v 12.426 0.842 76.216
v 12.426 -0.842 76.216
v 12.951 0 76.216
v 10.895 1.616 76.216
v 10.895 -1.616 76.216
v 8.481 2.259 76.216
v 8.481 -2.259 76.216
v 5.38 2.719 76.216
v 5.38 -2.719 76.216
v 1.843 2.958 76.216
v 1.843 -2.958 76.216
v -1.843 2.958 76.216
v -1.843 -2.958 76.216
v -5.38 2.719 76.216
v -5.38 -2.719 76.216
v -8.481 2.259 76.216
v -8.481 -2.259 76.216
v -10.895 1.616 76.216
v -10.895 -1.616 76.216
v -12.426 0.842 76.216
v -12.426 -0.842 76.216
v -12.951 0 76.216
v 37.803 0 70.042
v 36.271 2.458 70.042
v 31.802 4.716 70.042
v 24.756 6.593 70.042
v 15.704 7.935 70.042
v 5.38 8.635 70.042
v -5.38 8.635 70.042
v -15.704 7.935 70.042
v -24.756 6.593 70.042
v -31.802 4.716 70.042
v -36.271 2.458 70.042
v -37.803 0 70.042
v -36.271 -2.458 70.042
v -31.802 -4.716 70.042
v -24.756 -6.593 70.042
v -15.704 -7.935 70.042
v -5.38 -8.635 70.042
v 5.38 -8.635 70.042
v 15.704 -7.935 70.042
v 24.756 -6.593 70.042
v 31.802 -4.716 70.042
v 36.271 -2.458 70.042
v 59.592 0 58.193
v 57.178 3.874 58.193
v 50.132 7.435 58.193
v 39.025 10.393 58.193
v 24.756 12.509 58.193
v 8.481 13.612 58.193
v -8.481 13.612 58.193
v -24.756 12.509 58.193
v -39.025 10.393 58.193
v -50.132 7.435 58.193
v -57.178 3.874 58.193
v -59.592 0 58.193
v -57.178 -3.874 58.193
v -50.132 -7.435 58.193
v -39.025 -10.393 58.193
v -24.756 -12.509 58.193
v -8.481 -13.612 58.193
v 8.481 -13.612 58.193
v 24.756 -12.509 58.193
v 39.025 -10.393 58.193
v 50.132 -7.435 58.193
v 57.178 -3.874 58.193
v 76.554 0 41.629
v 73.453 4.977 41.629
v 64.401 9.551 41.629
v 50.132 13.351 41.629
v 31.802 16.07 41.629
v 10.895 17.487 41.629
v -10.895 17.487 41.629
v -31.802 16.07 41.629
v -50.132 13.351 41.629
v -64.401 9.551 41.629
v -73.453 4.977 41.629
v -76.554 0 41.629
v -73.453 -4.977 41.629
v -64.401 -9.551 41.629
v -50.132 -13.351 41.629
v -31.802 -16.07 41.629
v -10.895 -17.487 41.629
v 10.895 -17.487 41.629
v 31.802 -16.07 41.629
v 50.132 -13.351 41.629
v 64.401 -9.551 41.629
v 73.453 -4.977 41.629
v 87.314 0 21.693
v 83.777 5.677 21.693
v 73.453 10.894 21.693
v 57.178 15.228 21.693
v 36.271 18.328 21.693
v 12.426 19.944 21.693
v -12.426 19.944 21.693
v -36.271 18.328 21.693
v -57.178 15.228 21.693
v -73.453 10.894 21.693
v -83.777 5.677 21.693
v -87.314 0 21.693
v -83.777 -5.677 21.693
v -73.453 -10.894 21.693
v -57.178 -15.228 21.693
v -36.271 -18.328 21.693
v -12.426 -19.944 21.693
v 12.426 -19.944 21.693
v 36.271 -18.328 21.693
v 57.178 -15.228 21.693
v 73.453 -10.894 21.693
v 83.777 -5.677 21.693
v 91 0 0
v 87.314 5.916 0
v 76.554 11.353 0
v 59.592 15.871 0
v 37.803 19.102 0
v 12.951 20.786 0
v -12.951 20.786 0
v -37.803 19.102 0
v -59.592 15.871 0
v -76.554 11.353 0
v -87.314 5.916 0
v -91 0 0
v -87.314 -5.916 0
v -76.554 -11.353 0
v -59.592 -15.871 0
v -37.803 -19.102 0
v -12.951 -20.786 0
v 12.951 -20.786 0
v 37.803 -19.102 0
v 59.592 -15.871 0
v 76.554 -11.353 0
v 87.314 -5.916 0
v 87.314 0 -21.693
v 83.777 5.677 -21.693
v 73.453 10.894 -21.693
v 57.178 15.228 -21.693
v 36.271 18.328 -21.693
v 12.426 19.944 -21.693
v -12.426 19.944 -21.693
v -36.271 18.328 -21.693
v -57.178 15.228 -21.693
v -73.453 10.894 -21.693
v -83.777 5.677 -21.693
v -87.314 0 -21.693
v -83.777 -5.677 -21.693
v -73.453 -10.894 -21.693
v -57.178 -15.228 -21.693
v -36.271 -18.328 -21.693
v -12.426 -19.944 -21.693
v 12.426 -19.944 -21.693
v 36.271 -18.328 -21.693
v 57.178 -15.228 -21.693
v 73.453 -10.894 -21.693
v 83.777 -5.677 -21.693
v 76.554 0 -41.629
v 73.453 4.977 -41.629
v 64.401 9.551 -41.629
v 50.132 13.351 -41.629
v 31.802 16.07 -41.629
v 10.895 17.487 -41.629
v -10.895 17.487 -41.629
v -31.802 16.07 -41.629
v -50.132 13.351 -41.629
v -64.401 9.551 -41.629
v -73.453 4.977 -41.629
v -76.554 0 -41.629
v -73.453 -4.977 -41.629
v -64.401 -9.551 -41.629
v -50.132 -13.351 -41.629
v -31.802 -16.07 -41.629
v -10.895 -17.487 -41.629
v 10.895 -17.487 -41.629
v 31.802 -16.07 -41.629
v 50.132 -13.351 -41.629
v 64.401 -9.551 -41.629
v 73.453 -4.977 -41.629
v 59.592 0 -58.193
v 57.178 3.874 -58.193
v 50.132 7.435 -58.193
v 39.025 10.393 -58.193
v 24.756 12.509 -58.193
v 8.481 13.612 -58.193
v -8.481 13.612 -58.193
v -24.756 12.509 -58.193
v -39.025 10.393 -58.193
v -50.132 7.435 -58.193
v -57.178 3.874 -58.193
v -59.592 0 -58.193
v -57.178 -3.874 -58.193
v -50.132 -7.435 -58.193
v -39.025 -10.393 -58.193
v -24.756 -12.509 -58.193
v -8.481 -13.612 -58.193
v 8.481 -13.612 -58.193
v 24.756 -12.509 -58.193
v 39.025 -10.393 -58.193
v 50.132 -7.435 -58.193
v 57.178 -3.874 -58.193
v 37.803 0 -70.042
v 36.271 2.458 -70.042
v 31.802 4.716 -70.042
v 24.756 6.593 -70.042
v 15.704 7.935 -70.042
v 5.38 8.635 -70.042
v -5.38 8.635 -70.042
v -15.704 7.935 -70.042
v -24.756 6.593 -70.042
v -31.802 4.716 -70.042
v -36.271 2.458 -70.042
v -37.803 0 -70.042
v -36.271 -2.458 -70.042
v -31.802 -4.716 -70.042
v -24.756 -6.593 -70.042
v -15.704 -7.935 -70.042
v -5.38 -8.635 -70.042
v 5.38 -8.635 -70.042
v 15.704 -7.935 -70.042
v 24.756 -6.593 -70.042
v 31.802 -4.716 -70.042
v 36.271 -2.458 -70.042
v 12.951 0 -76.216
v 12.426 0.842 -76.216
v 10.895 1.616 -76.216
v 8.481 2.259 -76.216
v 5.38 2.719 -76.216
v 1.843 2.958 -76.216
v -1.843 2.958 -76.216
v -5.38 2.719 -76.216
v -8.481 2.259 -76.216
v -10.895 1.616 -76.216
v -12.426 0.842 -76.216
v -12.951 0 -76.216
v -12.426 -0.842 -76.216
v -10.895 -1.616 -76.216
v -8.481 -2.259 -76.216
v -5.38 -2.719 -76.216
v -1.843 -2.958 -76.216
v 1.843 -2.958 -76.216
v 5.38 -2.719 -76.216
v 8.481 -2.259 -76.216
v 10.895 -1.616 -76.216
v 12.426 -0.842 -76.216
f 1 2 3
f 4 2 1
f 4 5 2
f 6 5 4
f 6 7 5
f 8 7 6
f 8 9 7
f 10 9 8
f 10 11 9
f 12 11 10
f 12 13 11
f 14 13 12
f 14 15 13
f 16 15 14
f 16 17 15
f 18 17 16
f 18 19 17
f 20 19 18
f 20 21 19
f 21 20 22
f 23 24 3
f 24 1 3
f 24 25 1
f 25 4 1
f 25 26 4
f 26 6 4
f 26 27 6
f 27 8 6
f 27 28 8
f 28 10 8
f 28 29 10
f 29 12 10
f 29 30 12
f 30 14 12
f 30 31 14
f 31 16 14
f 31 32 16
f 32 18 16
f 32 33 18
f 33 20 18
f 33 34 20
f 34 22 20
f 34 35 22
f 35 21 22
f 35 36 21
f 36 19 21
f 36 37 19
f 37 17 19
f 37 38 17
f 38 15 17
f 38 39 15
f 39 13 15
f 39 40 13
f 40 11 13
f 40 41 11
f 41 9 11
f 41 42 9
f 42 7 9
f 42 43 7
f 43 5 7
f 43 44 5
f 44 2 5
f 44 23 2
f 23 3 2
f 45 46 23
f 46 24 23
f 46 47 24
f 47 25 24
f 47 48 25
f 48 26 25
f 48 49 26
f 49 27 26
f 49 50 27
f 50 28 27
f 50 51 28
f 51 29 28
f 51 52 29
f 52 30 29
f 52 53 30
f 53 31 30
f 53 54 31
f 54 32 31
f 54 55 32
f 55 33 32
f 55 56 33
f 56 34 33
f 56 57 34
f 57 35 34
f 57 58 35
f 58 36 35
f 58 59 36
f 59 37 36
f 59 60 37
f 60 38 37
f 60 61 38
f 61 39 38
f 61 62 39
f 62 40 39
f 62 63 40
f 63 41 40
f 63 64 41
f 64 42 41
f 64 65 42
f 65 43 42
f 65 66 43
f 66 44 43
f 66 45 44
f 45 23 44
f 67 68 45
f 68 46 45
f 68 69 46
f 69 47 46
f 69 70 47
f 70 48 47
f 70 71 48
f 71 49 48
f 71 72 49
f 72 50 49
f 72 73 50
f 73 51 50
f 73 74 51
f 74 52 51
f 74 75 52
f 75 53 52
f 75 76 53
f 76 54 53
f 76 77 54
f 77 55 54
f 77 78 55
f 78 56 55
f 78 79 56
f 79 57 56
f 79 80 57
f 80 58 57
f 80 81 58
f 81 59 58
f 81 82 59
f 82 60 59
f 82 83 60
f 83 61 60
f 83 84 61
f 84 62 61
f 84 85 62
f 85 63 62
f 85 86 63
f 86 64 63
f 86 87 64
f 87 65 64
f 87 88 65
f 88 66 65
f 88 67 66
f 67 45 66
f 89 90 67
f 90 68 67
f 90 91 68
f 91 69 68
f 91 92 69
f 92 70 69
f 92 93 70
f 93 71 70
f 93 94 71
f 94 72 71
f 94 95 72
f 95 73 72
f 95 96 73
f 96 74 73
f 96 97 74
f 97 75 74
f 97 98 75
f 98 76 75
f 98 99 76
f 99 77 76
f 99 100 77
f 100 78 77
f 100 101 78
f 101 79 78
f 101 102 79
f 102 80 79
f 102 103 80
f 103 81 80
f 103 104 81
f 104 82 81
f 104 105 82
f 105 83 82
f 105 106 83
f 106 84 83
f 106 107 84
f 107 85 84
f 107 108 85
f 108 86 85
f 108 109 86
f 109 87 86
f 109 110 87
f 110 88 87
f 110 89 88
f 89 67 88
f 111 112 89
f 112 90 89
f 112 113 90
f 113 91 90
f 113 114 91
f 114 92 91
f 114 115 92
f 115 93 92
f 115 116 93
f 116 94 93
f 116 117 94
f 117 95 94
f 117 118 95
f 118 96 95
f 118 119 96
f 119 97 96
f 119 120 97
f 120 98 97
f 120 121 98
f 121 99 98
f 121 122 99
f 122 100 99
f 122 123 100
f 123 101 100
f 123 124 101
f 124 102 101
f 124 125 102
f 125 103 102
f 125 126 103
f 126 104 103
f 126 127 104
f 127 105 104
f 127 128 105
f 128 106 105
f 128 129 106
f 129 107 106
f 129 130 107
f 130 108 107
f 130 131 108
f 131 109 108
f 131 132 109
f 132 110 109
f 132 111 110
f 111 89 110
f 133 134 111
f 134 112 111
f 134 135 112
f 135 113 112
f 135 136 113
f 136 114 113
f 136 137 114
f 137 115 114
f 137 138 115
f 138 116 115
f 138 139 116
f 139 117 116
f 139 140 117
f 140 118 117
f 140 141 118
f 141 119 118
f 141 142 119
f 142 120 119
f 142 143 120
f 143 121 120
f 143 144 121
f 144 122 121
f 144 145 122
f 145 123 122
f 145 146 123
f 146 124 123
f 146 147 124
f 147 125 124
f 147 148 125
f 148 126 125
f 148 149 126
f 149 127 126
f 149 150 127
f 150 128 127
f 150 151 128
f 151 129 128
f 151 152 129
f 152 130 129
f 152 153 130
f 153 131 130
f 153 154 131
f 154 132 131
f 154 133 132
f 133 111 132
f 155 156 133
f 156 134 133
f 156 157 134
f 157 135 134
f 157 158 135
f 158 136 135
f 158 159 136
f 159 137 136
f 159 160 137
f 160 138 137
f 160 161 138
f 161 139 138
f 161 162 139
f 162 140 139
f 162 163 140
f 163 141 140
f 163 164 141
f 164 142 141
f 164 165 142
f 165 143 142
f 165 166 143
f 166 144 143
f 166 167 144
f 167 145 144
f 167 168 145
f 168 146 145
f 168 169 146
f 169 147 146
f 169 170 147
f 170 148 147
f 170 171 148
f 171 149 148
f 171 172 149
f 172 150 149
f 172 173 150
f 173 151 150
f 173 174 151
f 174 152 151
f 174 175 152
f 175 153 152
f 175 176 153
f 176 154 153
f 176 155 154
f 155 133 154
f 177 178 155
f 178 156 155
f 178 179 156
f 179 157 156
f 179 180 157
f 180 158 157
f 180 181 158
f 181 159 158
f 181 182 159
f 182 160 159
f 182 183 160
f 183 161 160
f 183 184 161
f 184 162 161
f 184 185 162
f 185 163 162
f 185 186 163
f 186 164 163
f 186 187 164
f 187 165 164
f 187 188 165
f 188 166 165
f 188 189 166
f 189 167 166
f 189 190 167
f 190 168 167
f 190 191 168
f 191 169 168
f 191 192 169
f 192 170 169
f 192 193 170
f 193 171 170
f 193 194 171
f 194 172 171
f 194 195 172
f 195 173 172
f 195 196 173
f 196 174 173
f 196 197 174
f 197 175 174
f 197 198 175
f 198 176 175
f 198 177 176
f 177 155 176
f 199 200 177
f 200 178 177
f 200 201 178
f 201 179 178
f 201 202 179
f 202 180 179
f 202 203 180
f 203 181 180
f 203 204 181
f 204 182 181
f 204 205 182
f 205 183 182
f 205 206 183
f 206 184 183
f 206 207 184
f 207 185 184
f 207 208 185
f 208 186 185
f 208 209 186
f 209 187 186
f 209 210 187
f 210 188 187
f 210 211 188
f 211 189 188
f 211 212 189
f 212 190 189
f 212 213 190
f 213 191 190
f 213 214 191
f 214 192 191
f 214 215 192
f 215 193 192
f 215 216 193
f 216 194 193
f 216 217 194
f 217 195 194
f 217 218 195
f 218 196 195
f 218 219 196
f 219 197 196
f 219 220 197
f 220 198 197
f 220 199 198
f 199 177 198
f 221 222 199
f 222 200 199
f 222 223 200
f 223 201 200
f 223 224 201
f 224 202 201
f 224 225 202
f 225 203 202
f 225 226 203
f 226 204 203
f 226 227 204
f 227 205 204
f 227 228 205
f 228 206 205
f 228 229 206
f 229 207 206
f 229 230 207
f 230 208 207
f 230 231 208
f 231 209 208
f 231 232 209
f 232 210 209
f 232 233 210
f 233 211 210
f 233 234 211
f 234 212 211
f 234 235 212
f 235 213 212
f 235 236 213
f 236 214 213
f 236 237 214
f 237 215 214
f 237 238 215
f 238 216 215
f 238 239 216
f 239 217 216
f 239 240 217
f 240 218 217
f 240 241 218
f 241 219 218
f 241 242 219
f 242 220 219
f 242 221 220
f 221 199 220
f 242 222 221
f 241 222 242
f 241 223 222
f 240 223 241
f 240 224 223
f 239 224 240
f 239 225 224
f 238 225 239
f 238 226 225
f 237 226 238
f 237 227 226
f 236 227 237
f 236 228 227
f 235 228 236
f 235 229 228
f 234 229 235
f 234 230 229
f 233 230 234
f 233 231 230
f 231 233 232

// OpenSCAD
// Generated by SolidPython 1.0.1 on 2020-07-29 00:46:50


scale(v = [13, 3, 11]) {
	sphere(r = 7);
}
/***********************************************
*********      SolidPython code:      **********
************************************************
 
# import packages: SolidPython
from solid import *
from solid.utils import *
from itertools import chain, combinations, permutations


class Resize:

    def __init__(self, scad_file):
        self.scad_file = scad_file
        #self.scad_file = import_scad(scad_file)
        # cone/cylinder param:
        self.r1 = 0
        self.r2 = 0
        self.h = 0
        # rectangular prism param:
        self.w = 0
        self.l = 0
        # ellipse param:
        self.r = 0

    # import OpenScad code (file name corresponds to shape)


    # classify shape + parameters
    def assign(self, param1, param2, param3):
        if self.scad_file == 'cone.scad':
            self.r1 = param1
            self.r2 = param2
            self.h = param3
        elif self.scad_file == 'cylinder.scad':
            self.r1 = param1
            self.r2 = param2
            self.h = param3
        elif self.scad_file == 'rectangularPrism.scad':
            self.h = param1
            self.l = param2
            self.w = param3
        else:
            self.r = param1
            self.h = param2

    # resize parameters
    def iterate(self):
        x = range(3, 20, 2)
        i = 1
        if self.scad_file == 'cone.scad':
            tempList = list(permutations(x, 2))
            for temp in tempList:
                param1 = temp[0]
                param2 = temp[1]
                filepath = 'produced_scad_files/' + 'cone' + str(param1) + '_' + str(param2) + '_' + '.scad'
                scad_render_to_file(cylinder(h=param1, r1=param2, r2=0), filepath)

        elif self.scad_file == 'cylinder.scad':
            tempList = list(permutations(x, 3))
            for temp in tempList:
                param1 = temp[0]
                param2 = temp[1]
                filepath = 'produced_scad_files/' + 'cylinder' + str(param1) + '_' + str(param2) + '_' + '.scad'
                scad_render_to_file(cylinder(h=param1, r1=param2, r2=param2), filepath)

        elif self.scad_file == 'rectangularPrism.scad':
            tempList = list(permutations(x, 3))
            for temp in tempList:
                param1 = temp[0]
                param2 = temp[1]
                param3 = temp[2]
                filepath = 'produced_scad_files/' + 'rectangularPrism' + str(param1) + '_' + str(param2) + '_' + str(
                    param3) + '.scad'
                scad_render_to_file(cube(size=(param1, param2, param3)), filepath)

        elif self.scad_file == 'ellipse.scad':
            tempList = list(permutations(x, 4))
            for temp in tempList:
                param1 = temp[0]
                param2 = temp[1]
                param3 = temp[2]
                param4 = temp[3]
                filepath = 'produced_scad_files/' + 'ellipse' + str(param1) + '_' + str(param2) + '_' + str(param3) + '_' + str(param4) + '.scad'
                scad_render_to_file(scale([param1, param2, param3])(sphere(r=param4)), filepath)

    def render_to_scadfile(self):
        scad_render_to_file(scad, 'example.scad') 
 
************************************************/
